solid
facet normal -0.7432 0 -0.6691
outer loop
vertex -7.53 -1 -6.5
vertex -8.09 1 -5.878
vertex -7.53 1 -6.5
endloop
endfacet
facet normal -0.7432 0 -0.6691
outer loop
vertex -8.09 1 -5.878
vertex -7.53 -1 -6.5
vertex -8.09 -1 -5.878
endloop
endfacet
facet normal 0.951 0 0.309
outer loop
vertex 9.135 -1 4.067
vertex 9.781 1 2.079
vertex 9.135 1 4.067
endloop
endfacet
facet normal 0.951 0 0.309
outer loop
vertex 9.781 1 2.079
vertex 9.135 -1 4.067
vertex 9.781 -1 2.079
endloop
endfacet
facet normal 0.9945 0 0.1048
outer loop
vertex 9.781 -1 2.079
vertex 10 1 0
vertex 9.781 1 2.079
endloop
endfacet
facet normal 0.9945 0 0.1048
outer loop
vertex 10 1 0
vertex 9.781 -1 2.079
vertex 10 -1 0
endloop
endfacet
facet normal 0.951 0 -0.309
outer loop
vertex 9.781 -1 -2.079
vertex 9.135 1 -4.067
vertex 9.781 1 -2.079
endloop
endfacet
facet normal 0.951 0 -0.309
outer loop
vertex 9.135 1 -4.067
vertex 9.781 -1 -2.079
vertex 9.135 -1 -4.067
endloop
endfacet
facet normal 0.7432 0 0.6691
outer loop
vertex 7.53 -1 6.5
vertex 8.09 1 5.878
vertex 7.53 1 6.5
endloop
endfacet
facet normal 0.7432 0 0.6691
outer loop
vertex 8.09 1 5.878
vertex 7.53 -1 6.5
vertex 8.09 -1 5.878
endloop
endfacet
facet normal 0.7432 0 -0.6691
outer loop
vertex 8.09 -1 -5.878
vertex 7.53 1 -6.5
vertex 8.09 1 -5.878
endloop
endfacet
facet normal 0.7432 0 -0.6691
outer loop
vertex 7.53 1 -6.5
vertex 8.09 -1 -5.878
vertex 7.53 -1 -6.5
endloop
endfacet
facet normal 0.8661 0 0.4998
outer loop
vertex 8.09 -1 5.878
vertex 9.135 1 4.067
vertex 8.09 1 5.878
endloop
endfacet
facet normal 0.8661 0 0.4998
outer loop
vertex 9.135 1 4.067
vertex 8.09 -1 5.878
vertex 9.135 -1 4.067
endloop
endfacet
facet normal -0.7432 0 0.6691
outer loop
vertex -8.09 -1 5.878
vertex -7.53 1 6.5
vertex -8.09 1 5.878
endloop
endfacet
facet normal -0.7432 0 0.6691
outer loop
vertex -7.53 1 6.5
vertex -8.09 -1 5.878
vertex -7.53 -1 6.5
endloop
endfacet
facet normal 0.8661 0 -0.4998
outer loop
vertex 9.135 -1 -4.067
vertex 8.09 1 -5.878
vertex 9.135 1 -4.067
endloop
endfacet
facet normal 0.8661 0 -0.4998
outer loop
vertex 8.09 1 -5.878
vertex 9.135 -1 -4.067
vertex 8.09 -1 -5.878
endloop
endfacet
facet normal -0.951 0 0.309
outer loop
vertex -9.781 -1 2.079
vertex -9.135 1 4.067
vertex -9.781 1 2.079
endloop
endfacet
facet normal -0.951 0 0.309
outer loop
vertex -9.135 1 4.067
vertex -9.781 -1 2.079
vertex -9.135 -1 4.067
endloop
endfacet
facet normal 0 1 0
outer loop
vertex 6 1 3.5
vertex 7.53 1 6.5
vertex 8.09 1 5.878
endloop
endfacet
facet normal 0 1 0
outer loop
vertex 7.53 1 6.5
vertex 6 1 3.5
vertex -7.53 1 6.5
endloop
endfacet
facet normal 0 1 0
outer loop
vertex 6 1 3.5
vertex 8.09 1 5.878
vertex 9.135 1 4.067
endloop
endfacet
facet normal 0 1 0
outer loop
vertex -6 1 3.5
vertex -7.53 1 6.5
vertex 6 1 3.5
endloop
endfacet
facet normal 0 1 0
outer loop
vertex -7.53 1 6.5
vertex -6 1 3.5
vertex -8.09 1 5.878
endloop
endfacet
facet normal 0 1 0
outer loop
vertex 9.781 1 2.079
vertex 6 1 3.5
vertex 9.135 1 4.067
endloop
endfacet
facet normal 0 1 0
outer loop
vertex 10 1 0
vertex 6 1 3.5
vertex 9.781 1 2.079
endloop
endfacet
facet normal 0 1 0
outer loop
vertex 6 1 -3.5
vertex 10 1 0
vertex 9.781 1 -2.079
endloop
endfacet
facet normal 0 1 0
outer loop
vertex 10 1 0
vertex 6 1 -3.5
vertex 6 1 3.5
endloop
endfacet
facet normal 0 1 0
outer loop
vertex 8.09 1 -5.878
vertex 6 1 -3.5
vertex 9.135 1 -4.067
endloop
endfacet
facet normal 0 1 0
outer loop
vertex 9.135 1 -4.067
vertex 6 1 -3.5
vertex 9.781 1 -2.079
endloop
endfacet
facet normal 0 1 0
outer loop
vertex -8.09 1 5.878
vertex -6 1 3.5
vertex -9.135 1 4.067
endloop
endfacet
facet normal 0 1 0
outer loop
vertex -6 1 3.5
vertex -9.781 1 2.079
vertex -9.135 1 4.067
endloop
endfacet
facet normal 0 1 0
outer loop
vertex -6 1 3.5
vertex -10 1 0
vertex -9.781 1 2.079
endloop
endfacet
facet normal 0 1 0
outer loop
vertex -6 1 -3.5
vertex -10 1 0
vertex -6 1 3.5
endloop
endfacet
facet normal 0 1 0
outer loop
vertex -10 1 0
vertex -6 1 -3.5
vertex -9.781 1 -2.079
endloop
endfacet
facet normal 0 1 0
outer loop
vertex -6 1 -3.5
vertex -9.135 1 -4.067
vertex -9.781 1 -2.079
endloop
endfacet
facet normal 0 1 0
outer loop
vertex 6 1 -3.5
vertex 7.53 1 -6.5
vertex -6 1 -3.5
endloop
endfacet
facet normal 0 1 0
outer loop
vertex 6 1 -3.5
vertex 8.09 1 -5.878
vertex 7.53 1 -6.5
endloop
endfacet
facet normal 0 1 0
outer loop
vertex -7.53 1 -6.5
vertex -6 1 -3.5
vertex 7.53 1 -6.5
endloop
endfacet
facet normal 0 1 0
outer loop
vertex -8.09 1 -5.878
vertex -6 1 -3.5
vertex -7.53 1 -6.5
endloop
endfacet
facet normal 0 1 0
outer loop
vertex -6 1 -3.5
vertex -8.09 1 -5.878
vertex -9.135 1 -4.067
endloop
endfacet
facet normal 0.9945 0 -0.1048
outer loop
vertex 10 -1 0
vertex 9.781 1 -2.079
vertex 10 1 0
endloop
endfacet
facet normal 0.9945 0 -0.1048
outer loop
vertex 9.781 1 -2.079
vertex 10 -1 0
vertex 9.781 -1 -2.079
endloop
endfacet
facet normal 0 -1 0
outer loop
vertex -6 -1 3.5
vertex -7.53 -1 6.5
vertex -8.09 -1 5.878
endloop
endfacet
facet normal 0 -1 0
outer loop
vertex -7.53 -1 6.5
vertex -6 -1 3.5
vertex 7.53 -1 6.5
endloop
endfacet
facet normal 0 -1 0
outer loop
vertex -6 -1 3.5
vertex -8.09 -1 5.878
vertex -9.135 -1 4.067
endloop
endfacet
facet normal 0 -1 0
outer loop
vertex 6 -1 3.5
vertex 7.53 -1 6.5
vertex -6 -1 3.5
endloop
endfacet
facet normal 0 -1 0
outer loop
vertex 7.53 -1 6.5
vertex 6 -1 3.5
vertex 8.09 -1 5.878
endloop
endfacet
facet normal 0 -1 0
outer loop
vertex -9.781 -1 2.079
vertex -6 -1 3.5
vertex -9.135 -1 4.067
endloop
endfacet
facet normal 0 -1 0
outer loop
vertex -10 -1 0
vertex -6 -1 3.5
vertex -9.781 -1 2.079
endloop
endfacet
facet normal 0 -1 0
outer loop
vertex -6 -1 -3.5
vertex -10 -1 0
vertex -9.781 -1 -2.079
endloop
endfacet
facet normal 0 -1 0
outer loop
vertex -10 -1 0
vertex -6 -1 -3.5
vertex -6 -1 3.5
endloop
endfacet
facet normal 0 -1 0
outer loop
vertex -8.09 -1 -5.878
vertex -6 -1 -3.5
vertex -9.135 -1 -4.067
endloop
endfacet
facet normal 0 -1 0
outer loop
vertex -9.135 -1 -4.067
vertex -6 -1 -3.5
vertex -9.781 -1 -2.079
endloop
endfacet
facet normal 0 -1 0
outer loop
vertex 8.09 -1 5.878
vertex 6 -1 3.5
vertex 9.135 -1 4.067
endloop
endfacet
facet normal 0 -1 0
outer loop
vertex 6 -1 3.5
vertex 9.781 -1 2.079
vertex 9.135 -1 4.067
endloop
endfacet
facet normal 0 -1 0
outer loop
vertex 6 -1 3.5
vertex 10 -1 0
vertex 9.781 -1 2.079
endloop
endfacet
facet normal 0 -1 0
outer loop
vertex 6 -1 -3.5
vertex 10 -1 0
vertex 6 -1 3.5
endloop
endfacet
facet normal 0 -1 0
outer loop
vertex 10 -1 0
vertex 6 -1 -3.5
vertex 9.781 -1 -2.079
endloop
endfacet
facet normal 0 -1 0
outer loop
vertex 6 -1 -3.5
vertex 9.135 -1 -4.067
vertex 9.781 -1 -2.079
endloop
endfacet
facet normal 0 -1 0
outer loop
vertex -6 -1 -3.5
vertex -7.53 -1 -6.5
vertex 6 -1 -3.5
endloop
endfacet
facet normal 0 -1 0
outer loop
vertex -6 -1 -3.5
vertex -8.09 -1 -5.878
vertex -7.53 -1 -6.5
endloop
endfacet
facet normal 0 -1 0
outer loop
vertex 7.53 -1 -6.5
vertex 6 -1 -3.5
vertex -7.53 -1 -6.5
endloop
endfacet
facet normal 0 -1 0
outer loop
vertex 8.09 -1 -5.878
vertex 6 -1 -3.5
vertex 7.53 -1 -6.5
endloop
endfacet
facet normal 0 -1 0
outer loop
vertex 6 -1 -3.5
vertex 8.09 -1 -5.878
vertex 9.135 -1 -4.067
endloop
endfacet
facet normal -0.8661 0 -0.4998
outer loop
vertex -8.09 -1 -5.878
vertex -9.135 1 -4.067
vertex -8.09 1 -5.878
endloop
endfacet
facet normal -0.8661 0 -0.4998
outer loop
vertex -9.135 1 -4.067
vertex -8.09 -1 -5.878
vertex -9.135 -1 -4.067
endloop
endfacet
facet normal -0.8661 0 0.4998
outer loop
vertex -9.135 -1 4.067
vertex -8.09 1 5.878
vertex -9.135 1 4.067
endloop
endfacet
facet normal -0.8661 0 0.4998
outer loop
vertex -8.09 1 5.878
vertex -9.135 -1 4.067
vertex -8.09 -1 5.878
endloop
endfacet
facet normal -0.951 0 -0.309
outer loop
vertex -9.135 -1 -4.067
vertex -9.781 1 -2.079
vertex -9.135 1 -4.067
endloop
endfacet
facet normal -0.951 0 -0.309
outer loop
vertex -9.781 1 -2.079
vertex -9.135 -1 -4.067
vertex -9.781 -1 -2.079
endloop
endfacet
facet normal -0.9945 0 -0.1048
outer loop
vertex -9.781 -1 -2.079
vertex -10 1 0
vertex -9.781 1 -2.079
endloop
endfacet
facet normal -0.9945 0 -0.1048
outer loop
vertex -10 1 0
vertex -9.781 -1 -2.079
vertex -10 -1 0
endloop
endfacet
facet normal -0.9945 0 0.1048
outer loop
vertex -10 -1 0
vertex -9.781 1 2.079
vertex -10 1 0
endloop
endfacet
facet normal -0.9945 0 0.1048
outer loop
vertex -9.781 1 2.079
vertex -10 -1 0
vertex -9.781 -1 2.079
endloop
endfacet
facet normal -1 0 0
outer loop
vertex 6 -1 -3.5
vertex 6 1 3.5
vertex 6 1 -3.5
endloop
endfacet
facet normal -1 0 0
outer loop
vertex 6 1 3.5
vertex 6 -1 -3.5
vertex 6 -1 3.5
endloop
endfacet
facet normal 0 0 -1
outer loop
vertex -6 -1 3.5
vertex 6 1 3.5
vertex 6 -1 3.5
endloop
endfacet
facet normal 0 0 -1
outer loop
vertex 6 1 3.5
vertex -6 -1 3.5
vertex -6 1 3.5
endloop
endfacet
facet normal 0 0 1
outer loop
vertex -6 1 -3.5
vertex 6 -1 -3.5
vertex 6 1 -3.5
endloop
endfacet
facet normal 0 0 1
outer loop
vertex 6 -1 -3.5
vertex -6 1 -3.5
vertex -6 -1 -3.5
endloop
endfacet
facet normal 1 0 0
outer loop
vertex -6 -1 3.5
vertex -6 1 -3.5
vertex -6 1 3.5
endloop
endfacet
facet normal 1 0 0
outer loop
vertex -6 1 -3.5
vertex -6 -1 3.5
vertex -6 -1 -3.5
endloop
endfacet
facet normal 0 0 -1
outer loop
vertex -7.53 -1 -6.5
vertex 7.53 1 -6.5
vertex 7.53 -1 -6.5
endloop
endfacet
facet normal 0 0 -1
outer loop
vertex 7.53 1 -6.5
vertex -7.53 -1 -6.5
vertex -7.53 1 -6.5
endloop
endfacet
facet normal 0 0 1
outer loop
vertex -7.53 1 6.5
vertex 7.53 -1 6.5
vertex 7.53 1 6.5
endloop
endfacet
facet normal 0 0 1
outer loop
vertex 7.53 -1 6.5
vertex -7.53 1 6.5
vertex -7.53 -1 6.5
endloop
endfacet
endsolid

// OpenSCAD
difference() {
    // Claw shaft lock
    rotate([90,0,0]) cylinder(d=20,h=2, center=true);
    
    // Shaft hole    
    scale([12,25,7]) cube(1,1,1, center=true);
    
    // Top shave
    translate([0,0,-10]) scale([24,25,7]) cube(1,1,1, center=true);
    
    // Bottom shave
    translate([0,0,10]) scale([24,25,7]) cube(1,1,1, center=true);
}
